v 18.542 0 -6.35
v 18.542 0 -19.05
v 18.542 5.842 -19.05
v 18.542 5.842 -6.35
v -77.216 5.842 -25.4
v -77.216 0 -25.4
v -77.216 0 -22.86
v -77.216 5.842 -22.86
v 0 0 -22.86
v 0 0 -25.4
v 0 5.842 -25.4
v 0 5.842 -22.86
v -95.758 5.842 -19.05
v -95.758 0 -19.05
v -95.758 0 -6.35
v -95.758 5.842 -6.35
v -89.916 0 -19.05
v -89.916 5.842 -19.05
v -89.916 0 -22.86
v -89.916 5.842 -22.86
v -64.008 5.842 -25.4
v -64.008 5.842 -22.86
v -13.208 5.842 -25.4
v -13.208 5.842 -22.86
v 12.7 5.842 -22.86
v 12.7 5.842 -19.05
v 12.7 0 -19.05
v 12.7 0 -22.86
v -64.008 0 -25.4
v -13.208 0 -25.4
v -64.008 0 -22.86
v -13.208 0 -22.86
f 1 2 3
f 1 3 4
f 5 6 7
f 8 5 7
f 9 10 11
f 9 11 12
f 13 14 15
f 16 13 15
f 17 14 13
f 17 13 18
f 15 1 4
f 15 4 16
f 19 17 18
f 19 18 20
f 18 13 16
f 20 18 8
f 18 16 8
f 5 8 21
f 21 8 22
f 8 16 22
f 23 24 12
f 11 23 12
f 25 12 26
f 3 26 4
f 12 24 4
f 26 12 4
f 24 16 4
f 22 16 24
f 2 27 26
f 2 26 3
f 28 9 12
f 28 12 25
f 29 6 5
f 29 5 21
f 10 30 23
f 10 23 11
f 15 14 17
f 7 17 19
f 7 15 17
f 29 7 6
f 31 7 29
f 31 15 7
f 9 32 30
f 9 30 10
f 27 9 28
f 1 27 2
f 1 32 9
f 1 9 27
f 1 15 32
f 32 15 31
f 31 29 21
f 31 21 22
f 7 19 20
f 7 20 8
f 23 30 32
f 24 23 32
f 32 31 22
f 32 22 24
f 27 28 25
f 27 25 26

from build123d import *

# Parameters (mm, degrees)
F0_W     = 13.208
F0_H     = 2.54
F0_W_2   = 5.842
F0_H_2   = 12.7
F1_DEPTH = 5.842


with BuildPart() as f1:
    # F0 (on Front) → F1 (new body)
    with BuildSketch(Plane.XZ):
        with Locations((-70.612, -24.13)):
            Rectangle(F0_W, F0_H)
        with Locations((-6.604, -24.13)):
            Rectangle(F0_W, F0_H)
        with Locations((-92.837, -12.7)):
            Rectangle(F0_W_2, F0_H_2)
        with Locations((15.621, -12.7)):
            Rectangle(F0_W_2, F0_H_2)
        Polygon((12.7, -6.35), (-89.916, -6.35), (-89.916, -19.05), (-89.916, -22.86), (-77.216, -22.86), (-64.008, -22.86), (-13.208, -22.86), (0, -22.86), (12.7, -22.86), (12.7, -19.05), align=None)
    extrude(amount=-F1_DEPTH)


solid = f1.part
